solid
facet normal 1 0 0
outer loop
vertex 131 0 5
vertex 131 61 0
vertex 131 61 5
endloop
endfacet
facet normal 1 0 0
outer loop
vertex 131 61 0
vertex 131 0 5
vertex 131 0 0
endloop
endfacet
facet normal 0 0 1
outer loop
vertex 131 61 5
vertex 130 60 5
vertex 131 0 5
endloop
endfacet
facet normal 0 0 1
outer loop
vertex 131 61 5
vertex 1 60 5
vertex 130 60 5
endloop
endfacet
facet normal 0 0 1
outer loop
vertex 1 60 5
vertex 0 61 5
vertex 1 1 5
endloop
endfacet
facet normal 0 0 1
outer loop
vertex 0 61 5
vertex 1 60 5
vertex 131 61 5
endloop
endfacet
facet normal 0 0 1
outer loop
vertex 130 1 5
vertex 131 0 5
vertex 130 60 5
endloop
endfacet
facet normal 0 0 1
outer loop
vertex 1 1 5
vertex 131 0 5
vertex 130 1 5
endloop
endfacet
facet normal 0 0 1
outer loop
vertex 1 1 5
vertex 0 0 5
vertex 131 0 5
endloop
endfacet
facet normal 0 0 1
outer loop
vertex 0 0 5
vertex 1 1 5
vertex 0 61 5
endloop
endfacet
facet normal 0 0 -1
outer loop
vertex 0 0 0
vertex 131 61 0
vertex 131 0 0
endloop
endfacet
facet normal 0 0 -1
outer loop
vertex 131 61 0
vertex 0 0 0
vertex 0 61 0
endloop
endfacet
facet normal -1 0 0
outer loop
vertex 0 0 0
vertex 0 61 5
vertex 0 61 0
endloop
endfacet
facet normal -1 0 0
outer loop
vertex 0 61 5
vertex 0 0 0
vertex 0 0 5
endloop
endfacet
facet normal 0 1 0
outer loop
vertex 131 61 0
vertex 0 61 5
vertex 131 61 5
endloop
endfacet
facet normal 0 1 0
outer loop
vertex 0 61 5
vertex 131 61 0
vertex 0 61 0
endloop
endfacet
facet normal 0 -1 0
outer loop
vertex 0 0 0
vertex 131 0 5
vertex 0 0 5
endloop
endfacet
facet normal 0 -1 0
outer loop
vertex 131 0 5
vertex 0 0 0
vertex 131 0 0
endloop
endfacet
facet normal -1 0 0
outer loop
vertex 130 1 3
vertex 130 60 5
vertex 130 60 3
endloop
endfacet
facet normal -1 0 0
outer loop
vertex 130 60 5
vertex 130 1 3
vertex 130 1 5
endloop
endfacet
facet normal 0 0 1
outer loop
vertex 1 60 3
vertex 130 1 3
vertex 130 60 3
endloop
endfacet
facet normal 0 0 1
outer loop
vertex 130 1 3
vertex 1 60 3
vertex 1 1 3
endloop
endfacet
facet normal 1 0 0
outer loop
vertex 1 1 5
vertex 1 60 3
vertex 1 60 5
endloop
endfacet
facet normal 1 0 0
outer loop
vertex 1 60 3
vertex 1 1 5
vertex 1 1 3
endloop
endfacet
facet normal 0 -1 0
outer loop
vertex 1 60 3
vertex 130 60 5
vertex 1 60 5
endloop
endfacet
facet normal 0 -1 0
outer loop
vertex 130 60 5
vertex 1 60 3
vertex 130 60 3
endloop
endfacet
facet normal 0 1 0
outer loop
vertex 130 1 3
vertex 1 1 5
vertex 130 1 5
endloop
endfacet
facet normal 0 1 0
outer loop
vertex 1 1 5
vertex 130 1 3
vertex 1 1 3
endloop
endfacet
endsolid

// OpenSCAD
Wall=3;
DW=Wall*2;
LengthX=125+DW;
WidthY=55+DW;
BoxH=5;
Brim=1;
DB=Brim*2;

difference()
{
  cube([LengthX,WidthY,BoxH]);
  translate([Brim,Brim,Wall]) cube([LengthX-DB,WidthY-DB,BoxH+DB]);  
}
